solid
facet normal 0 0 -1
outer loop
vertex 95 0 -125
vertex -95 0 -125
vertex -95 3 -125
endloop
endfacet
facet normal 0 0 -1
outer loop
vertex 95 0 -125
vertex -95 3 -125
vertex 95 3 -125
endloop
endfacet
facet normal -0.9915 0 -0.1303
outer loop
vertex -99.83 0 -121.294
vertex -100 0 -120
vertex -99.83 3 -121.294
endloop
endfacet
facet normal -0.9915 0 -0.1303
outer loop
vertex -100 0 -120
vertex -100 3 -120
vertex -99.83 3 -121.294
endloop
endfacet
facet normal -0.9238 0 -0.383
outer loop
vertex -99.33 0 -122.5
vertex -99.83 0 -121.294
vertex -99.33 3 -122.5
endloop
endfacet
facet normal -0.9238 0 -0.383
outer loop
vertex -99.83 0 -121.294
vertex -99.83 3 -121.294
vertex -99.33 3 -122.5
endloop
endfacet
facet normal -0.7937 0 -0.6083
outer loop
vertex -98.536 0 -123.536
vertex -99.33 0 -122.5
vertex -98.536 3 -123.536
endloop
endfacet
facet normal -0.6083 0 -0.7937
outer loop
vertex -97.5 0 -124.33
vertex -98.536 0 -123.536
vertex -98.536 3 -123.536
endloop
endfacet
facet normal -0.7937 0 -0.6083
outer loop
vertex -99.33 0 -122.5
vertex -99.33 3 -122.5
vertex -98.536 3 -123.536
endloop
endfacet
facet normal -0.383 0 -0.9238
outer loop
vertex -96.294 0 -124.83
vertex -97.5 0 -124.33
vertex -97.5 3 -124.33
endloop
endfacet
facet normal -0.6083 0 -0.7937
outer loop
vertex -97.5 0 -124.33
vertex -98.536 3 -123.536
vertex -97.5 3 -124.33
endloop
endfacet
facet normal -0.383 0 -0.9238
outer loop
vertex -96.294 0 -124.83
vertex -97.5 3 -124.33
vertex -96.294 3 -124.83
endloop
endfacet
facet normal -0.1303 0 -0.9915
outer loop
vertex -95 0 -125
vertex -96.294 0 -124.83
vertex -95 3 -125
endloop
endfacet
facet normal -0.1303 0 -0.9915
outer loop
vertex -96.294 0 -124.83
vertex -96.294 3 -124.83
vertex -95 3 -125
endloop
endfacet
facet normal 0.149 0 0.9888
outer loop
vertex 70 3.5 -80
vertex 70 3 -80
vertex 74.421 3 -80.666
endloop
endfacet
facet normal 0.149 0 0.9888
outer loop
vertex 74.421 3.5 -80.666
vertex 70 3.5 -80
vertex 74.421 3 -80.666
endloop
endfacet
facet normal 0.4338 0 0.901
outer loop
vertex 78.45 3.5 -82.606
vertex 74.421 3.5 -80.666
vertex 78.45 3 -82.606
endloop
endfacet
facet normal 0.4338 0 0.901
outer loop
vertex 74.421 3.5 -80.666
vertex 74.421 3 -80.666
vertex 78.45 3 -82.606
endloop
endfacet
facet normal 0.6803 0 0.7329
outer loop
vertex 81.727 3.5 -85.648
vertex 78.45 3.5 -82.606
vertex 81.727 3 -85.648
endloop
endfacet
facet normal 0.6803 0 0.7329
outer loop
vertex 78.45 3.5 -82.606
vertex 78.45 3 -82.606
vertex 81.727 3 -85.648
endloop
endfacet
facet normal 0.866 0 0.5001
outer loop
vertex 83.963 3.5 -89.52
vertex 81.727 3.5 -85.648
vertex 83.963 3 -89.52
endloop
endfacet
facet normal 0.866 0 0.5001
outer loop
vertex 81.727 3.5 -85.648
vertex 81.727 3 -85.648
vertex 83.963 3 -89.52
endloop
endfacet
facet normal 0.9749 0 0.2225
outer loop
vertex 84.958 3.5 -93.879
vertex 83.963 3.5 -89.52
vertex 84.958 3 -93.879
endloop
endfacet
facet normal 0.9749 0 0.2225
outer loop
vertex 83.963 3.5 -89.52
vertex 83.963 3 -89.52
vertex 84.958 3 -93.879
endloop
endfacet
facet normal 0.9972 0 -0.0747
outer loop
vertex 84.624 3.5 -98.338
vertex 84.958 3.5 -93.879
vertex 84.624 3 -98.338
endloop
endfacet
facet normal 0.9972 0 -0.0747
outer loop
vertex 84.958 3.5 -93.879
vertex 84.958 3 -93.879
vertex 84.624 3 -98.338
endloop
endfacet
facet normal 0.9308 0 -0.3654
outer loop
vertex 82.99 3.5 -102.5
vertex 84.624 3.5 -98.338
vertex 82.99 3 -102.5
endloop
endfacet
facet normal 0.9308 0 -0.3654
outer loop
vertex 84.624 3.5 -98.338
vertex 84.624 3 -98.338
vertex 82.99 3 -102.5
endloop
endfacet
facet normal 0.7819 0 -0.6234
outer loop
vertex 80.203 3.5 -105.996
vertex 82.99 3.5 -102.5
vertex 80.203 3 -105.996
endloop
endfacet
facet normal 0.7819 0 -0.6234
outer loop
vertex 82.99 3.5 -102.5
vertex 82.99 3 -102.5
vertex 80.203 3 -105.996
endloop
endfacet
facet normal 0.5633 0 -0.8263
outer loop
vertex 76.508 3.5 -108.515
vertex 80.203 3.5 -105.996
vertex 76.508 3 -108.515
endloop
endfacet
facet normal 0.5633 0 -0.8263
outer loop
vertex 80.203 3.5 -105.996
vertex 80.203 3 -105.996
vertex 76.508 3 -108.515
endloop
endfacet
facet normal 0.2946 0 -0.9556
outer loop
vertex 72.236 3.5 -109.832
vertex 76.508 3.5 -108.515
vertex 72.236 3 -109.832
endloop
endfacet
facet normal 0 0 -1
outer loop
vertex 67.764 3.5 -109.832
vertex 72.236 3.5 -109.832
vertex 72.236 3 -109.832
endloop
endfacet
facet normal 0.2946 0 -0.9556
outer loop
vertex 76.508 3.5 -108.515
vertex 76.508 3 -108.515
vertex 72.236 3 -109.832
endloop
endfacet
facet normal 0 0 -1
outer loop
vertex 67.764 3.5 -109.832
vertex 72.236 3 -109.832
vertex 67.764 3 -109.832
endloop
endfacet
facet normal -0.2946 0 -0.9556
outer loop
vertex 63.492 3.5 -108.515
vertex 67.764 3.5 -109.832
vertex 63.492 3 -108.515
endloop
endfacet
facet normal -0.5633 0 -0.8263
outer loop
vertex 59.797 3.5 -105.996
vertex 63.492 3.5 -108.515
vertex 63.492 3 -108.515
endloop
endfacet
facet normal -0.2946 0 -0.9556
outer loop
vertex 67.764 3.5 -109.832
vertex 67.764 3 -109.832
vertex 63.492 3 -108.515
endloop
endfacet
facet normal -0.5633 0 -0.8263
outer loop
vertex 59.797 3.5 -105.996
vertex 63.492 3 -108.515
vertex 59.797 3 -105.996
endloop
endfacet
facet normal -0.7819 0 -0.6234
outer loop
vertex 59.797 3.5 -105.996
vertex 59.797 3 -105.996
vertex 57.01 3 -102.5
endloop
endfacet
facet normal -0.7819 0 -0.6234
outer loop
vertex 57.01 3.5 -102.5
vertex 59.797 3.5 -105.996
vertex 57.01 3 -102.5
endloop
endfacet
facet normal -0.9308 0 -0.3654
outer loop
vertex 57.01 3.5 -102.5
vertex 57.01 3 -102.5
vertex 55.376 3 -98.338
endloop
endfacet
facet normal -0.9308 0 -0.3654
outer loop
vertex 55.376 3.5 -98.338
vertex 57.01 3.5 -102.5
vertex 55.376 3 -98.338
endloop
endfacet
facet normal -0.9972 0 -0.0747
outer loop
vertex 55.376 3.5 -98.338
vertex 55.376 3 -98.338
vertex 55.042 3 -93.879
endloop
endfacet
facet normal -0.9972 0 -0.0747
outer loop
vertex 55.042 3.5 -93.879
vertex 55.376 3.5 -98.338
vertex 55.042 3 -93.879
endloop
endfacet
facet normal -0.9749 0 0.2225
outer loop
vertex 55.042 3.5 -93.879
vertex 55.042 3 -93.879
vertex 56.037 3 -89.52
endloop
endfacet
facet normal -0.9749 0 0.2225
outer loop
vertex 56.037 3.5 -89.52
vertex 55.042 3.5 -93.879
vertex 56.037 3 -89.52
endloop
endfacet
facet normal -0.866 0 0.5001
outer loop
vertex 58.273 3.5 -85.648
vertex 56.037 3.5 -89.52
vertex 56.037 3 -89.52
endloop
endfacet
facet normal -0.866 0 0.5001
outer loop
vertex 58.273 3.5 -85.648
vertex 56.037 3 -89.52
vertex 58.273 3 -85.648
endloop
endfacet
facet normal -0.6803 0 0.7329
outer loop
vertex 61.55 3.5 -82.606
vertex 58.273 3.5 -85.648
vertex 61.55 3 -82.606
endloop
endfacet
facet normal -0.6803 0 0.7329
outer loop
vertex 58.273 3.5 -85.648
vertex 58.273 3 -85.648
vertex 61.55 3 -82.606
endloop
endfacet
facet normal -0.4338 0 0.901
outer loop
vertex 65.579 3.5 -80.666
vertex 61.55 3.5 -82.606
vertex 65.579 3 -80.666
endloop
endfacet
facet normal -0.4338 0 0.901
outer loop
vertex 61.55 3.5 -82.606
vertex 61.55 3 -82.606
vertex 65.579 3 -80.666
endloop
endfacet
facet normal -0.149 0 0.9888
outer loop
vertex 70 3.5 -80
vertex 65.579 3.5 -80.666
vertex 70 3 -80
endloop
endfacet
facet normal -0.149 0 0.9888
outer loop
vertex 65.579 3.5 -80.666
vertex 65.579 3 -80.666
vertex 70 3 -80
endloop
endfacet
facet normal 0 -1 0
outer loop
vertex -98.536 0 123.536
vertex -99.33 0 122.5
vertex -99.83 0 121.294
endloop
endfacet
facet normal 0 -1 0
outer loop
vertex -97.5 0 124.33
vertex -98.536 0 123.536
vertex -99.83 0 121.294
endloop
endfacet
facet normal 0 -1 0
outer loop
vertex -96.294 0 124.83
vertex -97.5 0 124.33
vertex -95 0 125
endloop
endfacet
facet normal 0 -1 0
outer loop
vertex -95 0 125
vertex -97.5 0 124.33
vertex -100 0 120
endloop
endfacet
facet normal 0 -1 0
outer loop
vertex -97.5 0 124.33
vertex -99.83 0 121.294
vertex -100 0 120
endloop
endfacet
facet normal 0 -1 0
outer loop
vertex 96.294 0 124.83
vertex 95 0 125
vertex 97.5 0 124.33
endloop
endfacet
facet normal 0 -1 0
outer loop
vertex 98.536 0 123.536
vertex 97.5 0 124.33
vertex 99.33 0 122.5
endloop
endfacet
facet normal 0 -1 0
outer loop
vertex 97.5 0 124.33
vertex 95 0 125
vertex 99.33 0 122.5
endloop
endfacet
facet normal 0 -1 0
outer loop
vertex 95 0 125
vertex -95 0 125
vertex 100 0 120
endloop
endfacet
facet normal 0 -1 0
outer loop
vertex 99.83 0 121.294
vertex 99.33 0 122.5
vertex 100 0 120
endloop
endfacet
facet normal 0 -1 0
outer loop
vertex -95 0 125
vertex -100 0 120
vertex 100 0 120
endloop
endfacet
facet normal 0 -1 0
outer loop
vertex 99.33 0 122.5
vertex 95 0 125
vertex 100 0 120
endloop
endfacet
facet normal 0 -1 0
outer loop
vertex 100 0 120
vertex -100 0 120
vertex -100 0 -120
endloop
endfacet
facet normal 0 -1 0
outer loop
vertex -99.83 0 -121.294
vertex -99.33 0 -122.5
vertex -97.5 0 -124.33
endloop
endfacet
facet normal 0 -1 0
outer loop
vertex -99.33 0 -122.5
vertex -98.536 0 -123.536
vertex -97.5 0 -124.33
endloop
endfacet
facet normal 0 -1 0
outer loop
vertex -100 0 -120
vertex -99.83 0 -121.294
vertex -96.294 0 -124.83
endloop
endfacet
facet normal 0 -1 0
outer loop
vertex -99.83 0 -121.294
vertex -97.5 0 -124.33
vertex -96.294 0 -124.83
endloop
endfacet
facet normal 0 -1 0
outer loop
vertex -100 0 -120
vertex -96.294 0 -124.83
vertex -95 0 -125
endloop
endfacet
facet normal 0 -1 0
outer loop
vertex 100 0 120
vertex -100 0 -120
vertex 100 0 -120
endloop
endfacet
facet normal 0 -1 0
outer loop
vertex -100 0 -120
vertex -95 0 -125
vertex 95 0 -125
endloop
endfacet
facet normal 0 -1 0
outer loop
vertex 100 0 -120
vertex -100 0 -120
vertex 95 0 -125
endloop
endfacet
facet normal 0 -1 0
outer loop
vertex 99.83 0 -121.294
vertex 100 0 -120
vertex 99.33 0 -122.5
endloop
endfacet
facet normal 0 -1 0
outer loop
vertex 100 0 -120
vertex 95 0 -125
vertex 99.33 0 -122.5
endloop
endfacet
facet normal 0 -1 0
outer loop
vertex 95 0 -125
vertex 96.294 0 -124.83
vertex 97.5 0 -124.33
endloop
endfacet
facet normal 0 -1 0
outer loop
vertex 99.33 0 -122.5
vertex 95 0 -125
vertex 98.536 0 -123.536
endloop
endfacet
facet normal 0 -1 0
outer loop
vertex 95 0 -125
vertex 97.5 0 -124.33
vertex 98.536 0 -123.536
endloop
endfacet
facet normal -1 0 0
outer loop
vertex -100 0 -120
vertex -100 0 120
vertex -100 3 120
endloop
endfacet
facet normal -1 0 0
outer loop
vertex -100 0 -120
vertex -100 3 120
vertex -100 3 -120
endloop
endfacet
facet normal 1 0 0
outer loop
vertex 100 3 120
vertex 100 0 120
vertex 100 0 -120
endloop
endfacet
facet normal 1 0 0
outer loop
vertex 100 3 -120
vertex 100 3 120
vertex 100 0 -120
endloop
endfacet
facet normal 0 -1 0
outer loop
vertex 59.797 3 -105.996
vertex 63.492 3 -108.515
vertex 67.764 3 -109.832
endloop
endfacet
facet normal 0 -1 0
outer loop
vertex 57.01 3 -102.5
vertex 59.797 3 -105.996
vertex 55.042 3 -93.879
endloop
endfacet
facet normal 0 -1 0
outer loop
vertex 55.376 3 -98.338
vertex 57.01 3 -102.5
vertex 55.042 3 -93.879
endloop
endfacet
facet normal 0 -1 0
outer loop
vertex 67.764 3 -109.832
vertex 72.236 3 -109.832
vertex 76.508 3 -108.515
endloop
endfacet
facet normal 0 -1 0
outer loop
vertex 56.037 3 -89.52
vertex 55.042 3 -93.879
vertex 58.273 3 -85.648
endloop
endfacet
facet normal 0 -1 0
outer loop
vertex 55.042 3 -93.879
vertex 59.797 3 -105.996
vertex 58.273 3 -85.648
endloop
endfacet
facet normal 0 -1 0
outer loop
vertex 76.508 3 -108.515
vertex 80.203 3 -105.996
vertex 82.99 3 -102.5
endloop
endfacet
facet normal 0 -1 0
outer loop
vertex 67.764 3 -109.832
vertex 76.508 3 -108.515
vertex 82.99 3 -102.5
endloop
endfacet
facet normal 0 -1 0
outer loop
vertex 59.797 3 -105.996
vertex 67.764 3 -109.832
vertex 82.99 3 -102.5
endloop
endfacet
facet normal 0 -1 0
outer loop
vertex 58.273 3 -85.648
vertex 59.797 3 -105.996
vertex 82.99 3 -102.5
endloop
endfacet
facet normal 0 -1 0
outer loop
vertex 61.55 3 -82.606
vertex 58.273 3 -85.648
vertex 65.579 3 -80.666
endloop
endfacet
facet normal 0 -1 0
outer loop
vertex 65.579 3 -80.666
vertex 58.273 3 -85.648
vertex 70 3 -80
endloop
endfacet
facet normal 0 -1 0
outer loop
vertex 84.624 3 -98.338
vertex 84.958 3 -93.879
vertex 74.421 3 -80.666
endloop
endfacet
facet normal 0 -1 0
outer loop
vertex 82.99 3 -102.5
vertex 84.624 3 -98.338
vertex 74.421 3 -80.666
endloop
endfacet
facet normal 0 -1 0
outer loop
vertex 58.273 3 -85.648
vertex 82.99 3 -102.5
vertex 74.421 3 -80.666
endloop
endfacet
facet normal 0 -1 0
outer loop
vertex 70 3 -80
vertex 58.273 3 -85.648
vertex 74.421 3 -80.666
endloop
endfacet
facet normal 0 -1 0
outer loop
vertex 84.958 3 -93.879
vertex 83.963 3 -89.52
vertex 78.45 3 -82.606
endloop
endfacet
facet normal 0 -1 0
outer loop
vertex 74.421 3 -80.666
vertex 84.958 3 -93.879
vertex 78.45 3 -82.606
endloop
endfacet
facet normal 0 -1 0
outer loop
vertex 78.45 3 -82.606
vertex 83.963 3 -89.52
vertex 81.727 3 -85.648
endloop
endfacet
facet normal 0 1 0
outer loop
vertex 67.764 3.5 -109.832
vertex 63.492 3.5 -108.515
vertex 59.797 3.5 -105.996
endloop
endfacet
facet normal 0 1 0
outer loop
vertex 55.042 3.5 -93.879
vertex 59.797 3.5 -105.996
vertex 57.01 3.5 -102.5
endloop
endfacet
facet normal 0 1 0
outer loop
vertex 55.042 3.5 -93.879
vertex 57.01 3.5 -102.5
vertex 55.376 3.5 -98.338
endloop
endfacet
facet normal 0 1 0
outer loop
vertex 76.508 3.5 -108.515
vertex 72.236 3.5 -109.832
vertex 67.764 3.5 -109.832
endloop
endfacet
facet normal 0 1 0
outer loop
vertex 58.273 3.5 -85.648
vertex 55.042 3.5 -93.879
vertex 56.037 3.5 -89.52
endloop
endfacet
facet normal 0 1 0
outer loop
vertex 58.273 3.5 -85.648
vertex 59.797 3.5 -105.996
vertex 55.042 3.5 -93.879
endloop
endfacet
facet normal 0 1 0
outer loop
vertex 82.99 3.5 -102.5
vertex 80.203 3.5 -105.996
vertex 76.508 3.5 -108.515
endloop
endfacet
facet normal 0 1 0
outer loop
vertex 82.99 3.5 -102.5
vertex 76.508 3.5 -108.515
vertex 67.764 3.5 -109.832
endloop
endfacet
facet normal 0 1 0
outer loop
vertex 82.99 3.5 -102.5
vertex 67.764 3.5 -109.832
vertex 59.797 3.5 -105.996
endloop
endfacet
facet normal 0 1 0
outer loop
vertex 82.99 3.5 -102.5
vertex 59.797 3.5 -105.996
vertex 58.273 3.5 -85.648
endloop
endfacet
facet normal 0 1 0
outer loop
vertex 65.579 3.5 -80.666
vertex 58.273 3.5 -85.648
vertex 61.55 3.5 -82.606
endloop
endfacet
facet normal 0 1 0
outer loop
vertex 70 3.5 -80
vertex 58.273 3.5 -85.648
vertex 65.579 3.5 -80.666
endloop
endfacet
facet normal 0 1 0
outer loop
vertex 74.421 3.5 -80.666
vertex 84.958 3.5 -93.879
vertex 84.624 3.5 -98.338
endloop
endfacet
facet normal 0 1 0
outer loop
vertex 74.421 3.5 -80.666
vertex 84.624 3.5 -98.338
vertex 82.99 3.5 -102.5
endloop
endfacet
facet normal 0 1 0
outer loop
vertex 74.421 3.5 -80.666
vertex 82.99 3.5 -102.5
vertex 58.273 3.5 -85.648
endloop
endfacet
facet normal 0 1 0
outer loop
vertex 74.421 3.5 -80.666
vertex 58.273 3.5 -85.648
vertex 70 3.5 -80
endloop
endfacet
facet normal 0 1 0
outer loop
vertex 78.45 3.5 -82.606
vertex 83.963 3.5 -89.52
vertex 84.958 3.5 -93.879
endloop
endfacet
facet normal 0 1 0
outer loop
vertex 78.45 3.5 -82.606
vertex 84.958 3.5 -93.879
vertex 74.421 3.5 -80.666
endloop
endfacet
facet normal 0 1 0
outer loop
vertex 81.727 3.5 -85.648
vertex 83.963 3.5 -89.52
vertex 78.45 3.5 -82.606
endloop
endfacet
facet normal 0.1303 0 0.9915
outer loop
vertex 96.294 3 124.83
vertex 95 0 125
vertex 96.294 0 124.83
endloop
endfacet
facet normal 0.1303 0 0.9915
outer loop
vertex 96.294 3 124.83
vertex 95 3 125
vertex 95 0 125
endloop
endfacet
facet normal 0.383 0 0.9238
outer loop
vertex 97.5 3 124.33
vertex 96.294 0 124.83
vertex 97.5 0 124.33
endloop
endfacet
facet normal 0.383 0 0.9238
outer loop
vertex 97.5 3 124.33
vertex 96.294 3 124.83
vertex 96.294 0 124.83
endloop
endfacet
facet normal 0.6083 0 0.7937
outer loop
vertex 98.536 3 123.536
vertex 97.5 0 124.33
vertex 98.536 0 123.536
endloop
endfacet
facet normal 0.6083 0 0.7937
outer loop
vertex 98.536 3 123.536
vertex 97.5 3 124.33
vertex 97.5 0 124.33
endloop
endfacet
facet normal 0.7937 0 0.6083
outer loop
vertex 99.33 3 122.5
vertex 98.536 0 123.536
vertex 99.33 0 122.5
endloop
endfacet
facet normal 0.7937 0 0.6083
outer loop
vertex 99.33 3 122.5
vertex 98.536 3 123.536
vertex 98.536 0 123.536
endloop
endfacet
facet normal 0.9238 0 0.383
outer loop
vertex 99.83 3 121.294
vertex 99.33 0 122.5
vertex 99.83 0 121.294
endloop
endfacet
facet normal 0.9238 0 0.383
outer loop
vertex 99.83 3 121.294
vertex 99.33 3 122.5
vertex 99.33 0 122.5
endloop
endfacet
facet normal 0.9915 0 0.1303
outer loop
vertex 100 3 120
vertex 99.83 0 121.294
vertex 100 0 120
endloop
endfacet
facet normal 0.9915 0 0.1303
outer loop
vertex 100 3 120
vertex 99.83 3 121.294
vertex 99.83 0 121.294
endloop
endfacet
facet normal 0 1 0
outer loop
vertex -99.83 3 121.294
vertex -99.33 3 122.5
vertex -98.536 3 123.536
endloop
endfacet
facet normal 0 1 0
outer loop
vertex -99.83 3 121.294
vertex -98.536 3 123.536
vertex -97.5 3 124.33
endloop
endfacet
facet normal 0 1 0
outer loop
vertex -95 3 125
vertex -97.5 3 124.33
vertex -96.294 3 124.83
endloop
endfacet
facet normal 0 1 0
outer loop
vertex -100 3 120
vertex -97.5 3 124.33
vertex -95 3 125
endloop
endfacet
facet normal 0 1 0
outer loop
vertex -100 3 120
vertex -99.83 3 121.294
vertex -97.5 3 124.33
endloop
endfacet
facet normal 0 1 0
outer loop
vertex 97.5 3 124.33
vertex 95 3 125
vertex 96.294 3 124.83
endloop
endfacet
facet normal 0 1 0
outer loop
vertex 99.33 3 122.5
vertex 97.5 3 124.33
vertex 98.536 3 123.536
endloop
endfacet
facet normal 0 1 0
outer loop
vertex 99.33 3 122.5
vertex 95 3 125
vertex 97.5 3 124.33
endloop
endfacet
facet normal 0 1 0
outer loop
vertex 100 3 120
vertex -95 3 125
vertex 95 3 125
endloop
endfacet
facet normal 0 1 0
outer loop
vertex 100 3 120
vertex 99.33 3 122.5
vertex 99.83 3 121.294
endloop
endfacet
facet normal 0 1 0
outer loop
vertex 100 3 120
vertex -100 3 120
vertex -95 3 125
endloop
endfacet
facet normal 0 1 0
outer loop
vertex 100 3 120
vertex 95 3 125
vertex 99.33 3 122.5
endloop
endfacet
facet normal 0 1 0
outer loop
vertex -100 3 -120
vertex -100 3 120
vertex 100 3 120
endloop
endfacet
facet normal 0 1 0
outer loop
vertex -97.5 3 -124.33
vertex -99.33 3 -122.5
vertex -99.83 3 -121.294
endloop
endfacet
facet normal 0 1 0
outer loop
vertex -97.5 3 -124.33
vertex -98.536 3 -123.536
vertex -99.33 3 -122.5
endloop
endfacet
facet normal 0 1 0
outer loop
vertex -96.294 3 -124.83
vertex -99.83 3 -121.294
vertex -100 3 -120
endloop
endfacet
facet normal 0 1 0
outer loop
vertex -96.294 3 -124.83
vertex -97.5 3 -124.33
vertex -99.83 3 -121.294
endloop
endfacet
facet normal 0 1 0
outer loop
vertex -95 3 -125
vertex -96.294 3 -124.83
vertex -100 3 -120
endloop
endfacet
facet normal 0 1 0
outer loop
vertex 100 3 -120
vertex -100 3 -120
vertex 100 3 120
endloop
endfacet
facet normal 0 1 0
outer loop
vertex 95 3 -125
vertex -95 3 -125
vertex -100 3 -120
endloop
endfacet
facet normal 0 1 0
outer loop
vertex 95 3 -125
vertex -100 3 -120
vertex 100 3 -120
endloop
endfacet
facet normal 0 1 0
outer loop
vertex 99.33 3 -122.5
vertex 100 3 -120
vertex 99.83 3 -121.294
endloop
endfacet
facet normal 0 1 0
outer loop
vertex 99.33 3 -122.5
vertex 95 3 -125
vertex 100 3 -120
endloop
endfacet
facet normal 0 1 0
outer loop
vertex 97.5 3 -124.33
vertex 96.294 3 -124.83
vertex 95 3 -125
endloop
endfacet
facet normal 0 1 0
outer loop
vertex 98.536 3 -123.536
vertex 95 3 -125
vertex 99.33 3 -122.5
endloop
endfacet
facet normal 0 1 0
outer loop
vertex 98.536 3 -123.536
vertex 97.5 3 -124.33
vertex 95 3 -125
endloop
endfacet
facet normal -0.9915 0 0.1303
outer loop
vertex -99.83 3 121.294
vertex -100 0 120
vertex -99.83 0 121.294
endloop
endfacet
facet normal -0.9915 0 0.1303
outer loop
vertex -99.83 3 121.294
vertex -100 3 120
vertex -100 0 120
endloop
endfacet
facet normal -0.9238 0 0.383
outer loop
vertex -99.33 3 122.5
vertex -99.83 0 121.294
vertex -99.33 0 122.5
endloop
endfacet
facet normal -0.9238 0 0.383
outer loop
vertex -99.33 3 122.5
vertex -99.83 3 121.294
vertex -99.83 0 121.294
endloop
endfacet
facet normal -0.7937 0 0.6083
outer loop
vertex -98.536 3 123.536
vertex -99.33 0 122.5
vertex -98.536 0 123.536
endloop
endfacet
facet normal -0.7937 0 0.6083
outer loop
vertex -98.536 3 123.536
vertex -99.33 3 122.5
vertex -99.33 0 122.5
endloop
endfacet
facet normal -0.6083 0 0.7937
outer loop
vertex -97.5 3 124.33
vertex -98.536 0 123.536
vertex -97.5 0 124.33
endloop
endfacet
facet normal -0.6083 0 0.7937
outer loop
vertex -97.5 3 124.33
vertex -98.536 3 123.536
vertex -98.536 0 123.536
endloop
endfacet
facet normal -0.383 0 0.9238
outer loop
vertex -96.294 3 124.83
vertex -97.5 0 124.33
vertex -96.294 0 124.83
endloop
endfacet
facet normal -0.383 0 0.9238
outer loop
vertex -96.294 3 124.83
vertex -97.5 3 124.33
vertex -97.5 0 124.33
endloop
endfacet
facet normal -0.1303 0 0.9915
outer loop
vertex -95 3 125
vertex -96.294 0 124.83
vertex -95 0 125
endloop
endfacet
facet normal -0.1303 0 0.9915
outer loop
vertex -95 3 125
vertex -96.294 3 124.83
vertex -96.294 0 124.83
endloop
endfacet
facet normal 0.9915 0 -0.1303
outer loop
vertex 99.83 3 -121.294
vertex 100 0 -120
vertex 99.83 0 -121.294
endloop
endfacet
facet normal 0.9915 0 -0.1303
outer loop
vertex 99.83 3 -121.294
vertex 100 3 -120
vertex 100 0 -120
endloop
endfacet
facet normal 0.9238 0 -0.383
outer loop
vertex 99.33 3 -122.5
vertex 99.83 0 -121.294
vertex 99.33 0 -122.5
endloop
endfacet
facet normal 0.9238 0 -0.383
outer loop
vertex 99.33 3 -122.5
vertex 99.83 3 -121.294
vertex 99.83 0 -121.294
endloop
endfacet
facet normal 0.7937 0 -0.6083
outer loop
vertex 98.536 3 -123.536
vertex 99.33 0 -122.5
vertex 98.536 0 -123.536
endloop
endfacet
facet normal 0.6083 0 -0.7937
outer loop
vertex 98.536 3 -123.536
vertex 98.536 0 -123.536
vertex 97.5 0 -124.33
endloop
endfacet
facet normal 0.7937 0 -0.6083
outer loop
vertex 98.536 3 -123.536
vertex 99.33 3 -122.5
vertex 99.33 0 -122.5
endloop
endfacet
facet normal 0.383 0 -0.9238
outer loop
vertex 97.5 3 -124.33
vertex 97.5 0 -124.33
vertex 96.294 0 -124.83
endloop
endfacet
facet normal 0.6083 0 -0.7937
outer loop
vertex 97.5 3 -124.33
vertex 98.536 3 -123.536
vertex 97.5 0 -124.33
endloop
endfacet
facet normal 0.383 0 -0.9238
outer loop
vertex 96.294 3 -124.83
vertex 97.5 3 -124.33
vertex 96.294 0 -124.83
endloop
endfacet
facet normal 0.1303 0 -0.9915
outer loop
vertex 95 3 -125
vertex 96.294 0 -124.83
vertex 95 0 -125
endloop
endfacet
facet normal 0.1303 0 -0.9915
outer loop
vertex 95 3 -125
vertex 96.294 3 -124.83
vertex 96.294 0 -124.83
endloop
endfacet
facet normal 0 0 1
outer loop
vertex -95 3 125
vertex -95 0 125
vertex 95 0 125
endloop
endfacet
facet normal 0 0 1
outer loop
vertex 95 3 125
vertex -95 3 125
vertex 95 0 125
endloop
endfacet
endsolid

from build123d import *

# Parameters (mm, degrees)
SKETCH1_W           = 200
SKETCH1_H           = 250
BOSS_EXTRUDE1_DEPTH = 3
SKETCH2_R           = 15
BOSS_EXTRUDE6_DEPTH = 0.5
FILLET1_R           = 5


with BuildPart() as part:
    # Sketch1 → Boss-Extrude1 (new body)
    with BuildSketch(Plane(origin=(0, 0, 0), x_dir=(1, 0, 0), z_dir=(0, 1, 0))):
        Rectangle(SKETCH1_W, SKETCH1_H)
    extrude(amount=BOSS_EXTRUDE1_DEPTH)

    # Fillet1
    fillet1_edges = [part.edges().sort_by_distance(p)[0] for p in [
        (-100, 1.5, -125),
        (100, 1.5, -125),
        (100, 1.5, 125),
        (-100, 1.5, 125),
    ]]
    fillet(fillet1_edges, radius=FILLET1_R)


with BuildPart() as body_2:
    # Sketch2 → Boss-Extrude6 (new body)
    with BuildSketch(Plane(origin=(0, 3, 0), x_dir=(1, 0, 0), z_dir=(0, 1, 0))):
        with Locations(Location((70, 95, 0), (0, 0, 270))):
            Circle(SKETCH2_R)
    extrude(amount=BOSS_EXTRUDE6_DEPTH)


solid = Compound([part.part, body_2.part])
